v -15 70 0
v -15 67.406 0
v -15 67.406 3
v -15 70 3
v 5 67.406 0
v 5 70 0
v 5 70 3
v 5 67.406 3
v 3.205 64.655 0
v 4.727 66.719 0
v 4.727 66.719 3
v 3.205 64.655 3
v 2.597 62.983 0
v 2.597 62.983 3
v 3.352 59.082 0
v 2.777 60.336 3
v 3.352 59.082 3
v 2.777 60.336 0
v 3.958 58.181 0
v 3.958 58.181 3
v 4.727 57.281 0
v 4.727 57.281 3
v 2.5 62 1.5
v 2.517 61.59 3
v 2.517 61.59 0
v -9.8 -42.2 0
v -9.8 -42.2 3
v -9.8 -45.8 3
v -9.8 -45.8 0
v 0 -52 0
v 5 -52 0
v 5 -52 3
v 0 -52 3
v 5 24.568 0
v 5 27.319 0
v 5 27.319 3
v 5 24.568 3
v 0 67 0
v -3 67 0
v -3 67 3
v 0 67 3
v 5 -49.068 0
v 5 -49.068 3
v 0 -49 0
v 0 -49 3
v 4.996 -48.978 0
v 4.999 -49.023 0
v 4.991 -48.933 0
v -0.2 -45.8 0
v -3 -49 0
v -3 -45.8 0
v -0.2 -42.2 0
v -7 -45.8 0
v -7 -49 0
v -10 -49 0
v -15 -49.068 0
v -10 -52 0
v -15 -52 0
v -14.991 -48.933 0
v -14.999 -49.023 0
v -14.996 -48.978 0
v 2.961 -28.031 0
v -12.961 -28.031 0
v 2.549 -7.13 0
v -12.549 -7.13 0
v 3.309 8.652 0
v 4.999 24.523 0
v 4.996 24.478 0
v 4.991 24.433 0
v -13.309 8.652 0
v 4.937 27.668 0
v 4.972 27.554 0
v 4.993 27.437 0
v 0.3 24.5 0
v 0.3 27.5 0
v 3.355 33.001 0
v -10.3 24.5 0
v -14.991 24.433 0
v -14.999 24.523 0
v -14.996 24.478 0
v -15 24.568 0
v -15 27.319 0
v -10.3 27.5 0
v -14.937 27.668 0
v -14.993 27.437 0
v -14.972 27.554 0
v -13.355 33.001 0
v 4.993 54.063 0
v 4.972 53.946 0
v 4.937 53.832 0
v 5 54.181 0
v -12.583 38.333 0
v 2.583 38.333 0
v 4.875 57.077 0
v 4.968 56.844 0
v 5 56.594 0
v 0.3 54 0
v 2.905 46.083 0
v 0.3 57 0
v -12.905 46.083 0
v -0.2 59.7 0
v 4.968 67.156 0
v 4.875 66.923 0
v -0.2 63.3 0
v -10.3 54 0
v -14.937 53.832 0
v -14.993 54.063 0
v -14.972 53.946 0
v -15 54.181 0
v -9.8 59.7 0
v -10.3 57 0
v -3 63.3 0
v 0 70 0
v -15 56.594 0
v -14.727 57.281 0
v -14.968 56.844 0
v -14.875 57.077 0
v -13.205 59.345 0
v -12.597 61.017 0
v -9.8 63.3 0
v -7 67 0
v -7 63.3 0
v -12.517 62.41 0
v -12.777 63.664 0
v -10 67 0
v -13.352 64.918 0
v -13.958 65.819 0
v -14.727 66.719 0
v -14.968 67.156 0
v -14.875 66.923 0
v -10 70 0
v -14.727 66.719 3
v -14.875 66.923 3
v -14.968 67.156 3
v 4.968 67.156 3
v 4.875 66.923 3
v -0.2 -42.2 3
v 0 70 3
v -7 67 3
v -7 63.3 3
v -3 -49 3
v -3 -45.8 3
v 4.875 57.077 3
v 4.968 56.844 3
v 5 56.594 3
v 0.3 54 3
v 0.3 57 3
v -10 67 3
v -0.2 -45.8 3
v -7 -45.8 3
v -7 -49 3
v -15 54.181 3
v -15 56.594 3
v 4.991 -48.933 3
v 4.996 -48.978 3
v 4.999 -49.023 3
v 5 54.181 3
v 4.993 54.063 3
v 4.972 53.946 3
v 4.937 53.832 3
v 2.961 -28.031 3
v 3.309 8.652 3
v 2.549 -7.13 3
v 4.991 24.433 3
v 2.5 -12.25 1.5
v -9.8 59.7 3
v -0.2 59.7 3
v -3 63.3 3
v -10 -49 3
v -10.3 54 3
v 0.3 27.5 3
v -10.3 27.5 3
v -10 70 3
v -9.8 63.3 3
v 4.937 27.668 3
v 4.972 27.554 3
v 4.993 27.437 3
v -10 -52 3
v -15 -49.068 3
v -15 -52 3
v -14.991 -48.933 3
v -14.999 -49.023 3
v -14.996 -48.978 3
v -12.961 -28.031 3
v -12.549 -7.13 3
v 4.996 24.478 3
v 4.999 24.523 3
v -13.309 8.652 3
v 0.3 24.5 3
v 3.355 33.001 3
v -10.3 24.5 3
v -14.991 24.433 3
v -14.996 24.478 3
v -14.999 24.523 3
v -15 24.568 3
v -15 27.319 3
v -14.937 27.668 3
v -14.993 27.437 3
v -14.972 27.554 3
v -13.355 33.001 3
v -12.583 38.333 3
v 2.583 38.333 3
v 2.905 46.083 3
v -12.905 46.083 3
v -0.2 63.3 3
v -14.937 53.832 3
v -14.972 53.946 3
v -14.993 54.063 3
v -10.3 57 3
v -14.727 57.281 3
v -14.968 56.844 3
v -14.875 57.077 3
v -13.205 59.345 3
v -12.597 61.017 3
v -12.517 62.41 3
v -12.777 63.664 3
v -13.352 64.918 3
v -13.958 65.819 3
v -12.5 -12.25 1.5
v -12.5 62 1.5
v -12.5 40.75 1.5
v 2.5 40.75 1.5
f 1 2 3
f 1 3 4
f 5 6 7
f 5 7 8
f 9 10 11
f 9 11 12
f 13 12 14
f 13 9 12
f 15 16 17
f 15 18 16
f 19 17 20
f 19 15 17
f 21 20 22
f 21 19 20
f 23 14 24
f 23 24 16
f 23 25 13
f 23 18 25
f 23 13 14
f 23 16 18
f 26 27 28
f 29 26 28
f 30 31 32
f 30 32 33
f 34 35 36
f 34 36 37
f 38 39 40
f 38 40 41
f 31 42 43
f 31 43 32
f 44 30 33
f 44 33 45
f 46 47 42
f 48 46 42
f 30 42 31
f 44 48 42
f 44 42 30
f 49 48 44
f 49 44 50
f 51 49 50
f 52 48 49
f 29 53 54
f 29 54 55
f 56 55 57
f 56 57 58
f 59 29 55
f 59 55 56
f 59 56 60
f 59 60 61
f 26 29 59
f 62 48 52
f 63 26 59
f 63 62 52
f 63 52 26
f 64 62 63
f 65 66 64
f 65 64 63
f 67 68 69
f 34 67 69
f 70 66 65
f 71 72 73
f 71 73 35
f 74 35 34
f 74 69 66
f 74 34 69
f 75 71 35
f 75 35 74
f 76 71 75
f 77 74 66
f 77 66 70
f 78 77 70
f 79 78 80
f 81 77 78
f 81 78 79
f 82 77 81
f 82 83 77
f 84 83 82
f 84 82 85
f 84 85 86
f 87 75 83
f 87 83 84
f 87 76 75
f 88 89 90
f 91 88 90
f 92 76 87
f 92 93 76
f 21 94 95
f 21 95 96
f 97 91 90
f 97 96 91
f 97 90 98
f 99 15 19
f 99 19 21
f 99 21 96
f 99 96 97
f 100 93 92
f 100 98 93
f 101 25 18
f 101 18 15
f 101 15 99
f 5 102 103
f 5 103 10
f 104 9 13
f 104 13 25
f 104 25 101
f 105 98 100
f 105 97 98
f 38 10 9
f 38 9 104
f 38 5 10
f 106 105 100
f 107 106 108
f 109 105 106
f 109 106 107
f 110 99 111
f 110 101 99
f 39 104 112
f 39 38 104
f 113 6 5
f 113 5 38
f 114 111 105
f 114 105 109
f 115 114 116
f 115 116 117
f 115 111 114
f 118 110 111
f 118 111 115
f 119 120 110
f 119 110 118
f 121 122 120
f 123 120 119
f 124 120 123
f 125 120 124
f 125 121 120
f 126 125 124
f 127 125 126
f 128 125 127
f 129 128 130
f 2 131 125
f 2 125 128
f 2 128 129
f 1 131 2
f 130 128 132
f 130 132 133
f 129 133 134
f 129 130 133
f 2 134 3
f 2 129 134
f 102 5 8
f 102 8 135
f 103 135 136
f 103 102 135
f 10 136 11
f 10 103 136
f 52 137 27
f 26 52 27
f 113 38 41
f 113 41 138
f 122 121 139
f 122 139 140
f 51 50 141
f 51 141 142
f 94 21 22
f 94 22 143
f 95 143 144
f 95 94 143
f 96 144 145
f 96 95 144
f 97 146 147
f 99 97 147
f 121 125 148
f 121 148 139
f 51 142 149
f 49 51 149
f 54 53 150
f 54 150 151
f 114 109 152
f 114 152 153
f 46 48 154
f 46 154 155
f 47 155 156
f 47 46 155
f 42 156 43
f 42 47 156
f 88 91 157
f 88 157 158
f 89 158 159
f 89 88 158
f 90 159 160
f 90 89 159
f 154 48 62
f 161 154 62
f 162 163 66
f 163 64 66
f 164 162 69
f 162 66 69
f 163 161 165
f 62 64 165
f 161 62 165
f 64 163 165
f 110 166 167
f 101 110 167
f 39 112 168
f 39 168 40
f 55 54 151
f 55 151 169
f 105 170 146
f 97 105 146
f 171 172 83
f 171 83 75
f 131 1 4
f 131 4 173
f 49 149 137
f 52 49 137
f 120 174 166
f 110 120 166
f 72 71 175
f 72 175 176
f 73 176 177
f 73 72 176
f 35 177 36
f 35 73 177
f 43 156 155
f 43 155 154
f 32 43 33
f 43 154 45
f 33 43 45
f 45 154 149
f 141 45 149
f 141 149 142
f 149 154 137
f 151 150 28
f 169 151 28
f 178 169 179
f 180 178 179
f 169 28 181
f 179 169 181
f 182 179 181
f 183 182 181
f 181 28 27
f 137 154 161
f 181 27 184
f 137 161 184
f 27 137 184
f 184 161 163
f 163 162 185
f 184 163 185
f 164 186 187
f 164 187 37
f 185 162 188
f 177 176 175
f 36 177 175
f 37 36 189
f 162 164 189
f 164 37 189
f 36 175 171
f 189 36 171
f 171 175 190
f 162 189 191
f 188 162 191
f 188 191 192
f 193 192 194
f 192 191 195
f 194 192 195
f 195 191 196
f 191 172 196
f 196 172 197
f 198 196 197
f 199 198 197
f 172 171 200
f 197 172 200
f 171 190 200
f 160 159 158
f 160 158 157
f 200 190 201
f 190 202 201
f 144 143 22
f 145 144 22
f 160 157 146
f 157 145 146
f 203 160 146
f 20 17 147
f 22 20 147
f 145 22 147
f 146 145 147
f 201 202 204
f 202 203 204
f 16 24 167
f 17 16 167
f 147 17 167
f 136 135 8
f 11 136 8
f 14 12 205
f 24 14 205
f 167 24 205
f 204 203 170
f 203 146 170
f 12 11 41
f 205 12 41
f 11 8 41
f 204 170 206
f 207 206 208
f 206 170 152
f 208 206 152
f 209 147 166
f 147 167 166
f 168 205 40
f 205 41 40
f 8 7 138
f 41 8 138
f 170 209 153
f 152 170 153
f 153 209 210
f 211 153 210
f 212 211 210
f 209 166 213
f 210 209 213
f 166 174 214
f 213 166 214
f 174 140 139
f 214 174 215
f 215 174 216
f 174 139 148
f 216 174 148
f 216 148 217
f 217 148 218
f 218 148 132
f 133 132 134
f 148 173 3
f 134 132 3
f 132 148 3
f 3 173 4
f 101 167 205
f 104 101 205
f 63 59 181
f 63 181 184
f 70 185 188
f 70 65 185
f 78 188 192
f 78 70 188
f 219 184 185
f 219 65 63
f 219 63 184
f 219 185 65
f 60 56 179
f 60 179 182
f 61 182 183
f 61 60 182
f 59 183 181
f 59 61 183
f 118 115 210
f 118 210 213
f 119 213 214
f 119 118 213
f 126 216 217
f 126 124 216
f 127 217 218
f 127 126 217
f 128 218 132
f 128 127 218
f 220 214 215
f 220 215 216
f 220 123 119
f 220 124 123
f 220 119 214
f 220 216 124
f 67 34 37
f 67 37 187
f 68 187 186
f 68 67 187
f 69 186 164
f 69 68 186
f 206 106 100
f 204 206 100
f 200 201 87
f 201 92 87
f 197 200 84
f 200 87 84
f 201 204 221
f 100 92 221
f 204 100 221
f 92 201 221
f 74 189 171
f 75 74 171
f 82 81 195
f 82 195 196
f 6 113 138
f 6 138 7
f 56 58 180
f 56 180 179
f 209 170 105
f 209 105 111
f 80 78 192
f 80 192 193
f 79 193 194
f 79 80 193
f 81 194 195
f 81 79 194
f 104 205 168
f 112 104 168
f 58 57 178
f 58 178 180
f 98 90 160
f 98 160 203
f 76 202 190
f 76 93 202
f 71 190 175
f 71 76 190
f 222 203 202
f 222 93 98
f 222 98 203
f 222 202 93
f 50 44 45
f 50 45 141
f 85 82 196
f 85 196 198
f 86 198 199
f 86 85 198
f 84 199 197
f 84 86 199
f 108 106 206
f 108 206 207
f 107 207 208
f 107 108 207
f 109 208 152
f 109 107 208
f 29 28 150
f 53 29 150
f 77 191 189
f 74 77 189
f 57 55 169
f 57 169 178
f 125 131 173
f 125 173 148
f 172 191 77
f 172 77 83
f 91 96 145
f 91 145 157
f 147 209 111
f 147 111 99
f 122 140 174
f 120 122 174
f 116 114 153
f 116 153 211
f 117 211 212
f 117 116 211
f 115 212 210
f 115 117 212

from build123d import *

# Parameters (mm, degrees)
CROQUIS1_W              = 10
CROQUIS1_H              = 3
SALIENTE_EXTRUIR1_DEPTH = 3
CROQUIS2_W              = 0.3
CROQUIS2_H              = 0.3
CROQUIS2_H_2            = 3
CORTAR_EXTRUIR2_DEPTH   = 3


with BuildPart() as part:
    # Croquis1 → Saliente-Extruir1 (new body)
    with BuildSketch(Plane.XY):
        with BuildLine():
            Line((-10, 70), (-10, 67))
            Line((-10, 67), (-7, 67))
            Line((-7, 67), (-7, 63))
            Line((-7, 63), (-9.5, 63))
            Line((-9.5, 63), (-9.5, 60))
            Line((-9.5, 60), (-0.5, 60))
            Line((-0.5, 60), (-0.5, 63))
            Line((-0.5, 63), (-3, 63))
            Line((-3, 63), (-3, 67))
            Line((-3, 67), (0, 67))
            Line((0, 67), (0, 70))
            Line((0, 70), (5, 70))
            Line((5, 70), (5, 67.405747627))
            ThreePointArc((5, 67.405747627), (4.929306729, 67.036438809), (4.727221995, 66.719345288))
            add(Edge.make_bspline(
                [(4.727221995, 66.719345288), (3.242407332, 65.146230192), (1.757592668, 62), (3.242407332, 58.853769808), (4.727221995, 57.280654712)],
                knots=[0.028065471, 0.028065471, 0.028065471, 0.028065471, 0.5, 0.971934529, 0.971934529, 0.971934529, 0.971934529], degree=3))
            ThreePointArc((4.727221995, 57.280654712), (4.929306729, 56.963561191), (5, 56.594252373))
            Line((5, 56.594252373), (5, 54.181314171))
            ThreePointArc((5, 54.181314171), (4.9841425, 54.003934523), (4.937072921, 53.832180471))
            add(Edge.make_bspline(
                [(4.937072921, 53.832180471), (3.31235764, 49.471453647), (1.68764236, 40.75), (3.31235764, 32.028546353), (4.937072921, 27.667819529)],
                knots=[0.006332812, 0.006332812, 0.006332812, 0.006332812, 0.5, 0.993667188, 0.993667188, 0.993667188, 0.993667188], degree=3))
            ThreePointArc((4.937072921, 27.667819529), (4.9841425, 27.496065477), (5, 27.318685829))
            Line((5, 27.318685829), (5, 24.567654138))
            ThreePointArc((5, 24.567654138), (4.997723384, 24.500214919), (4.990903903, 24.433082766))
            add(Edge.make_bspline(
                [(4.990903903, -48.933082766), (3.330301301, -36.70538851), (1.669698699, -12.25), (3.330301301, 12.20538851), (4.990903903, 24.433082766)],
                knots=[0.000910439, 0.000910439, 0.000910439, 0.000910439, 0.5, 0.999089561, 0.999089561, 0.999089561, 0.999089561], degree=3))
            ThreePointArc((4.990903903, -48.933082766), (4.997723384, -49.000214919), (5, -49.067654138))
            Line((5, -49.067654138), (5, -51.701381229))
            Line((5, -51.701381229), (5, -52))
            Line((5, -52), (0, -52))
            Line((0, -52), (0, -49))
            Line((0, -49), (-3, -49))
            Line((-3, -49), (-3, -45.5))
            Line((-3, -45.5), (-0.5, -45.5))
            Line((-0.5, -45.5), (-0.5, -42.5))
            Line((-0.5, -42.5), (-9.5, -42.5))
            Line((-9.5, -42.5), (-9.5, -45.5))
            Line((-9.5, -45.5), (-7, -45.5))
            Line((-7, -45.5), (-7, -49))
            Line((-7, -49), (-10, -49))
            Line((-10, -49), (-10, -52))
            Line((-10, -52), (-15, -52))
            Line((-15, -52), (-15, -51.701381229))
            Line((-15, -51.701381229), (-15, -49.067654138))
            ThreePointArc((-15, -49.067654138), (-14.997723384, -49.000214919), (-14.990903903, -48.933082766))
            add(Edge.make_bspline(
                [(-14.990903903, -48.933082766), (-13.330301301, -36.70538851), (-11.669698699, -12.25), (-13.330301301, 12.20538851), (-14.990903903, 24.433082766)],
                knots=[0.000910439, 0.000910439, 0.000910439, 0.000910439, 0.5, 0.999089561, 0.999089561, 0.999089561, 0.999089561], degree=3))
            ThreePointArc((-14.990903903, 24.433082766), (-14.997723384, 24.500214919), (-15, 24.567654138))
            Line((-15, 24.567654138), (-15, 27.318685829))
            ThreePointArc((-15, 27.318685829), (-14.9841425, 27.496065477), (-14.937072921, 27.667819529))
            add(Edge.make_bspline(
                [(-14.937072921, 53.832180471), (-13.31235764, 49.471453647), (-11.68764236, 40.75), (-13.31235764, 32.028546353), (-14.937072921, 27.667819529)],
                knots=[0.006332812, 0.006332812, 0.006332812, 0.006332812, 0.5, 0.993667188, 0.993667188, 0.993667188, 0.993667188], degree=3))
            ThreePointArc((-14.937072921, 53.832180471), (-14.9841425, 54.003934523), (-15, 54.181314171))
            Line((-15, 54.181314171), (-15, 56.594252373))
            ThreePointArc((-15, 56.594252373), (-14.929306729, 56.963561191), (-14.727221995, 57.280654712))
            add(Edge.make_bspline(
                [(-14.727221995, 57.280654712), (-13.242407332, 58.853769808), (-11.757592668, 62), (-13.242407332, 65.146230192), (-14.727221995, 66.719345288)],
                knots=[0.028065471, 0.028065471, 0.028065471, 0.028065471, 0.5, 0.971934529, 0.971934529, 0.971934529, 0.971934529], degree=3))
            ThreePointArc((-14.727221995, 66.719345288), (-14.929306729, 67.036438809), (-15, 67.405747627))
            Line((-15, 67.405747627), (-15, 70))
            Line((-15, 70), (-10, 70))
        make_face()
        with Locations((-5, 26)):
            Rectangle(CROQUIS1_W, CROQUIS1_H, mode=Mode.SUBTRACT)
        with Locations((-5, 55.5)):
            Rectangle(CROQUIS1_W, CROQUIS1_H, mode=Mode.SUBTRACT)
    extrude(amount=SALIENTE_EXTRUIR1_DEPTH)

    # Croquis2 → Cortar-Extruir2 (cut)
    with BuildSketch(Plane.XY.offset(3)):
        Polygon((-9.8, -45.5), (-9.8, -45.8), (-9.5, -45.8), (-7, -45.8), (-7, -45.5), (-9.5, -45.5), (-9.5, -42.5), (-0.5, -42.5), (-0.5, -42.2), (-9.5, -42.2), (-9.8, -42.2), (-9.8, -42.5), align=None)
        Polygon((-0.5, -45.8), (-0.2, -45.8), (-0.2, -45.5), (-0.2, -42.5), (-0.5, -42.5), (-0.5, -45.5), (-3, -45.5), (-3, -45.8), align=None)
        with Locations((-0.35, -42.35)):
            Rectangle(CROQUIS2_W, CROQUIS2_H)
        with Locations((-10.15, 26)):
            Rectangle(CROQUIS2_W, CROQUIS2_H_2)
        with Locations((0.15, 26)):
            Rectangle(CROQUIS2_W, CROQUIS2_H_2)
        with Locations((0.15, 55.5)):
            Rectangle(CROQUIS2_W, CROQUIS2_H_2)
        with Locations((-10.15, 55.5)):
            Rectangle(CROQUIS2_W, CROQUIS2_H_2)
        Polygon((-9.8, 63.3), (-9.5, 63.3), (-7, 63.3), (-7, 63), (-9.5, 63), (-9.5, 60), (-0.5, 60), (-0.5, 63), (-3, 63), (-3, 63.3), (-0.5, 63.3), (-0.2, 63.3), (-0.2, 63), (-0.2, 60), (-0.2, 59.7), (-0.5, 59.7), (-9.5, 59.7), (-9.8, 59.7), (-9.8, 60), (-9.8, 63), align=None)
    extrude(amount=-CORTAR_EXTRUIR2_DEPTH, mode=Mode.SUBTRACT)


solid = part.part
